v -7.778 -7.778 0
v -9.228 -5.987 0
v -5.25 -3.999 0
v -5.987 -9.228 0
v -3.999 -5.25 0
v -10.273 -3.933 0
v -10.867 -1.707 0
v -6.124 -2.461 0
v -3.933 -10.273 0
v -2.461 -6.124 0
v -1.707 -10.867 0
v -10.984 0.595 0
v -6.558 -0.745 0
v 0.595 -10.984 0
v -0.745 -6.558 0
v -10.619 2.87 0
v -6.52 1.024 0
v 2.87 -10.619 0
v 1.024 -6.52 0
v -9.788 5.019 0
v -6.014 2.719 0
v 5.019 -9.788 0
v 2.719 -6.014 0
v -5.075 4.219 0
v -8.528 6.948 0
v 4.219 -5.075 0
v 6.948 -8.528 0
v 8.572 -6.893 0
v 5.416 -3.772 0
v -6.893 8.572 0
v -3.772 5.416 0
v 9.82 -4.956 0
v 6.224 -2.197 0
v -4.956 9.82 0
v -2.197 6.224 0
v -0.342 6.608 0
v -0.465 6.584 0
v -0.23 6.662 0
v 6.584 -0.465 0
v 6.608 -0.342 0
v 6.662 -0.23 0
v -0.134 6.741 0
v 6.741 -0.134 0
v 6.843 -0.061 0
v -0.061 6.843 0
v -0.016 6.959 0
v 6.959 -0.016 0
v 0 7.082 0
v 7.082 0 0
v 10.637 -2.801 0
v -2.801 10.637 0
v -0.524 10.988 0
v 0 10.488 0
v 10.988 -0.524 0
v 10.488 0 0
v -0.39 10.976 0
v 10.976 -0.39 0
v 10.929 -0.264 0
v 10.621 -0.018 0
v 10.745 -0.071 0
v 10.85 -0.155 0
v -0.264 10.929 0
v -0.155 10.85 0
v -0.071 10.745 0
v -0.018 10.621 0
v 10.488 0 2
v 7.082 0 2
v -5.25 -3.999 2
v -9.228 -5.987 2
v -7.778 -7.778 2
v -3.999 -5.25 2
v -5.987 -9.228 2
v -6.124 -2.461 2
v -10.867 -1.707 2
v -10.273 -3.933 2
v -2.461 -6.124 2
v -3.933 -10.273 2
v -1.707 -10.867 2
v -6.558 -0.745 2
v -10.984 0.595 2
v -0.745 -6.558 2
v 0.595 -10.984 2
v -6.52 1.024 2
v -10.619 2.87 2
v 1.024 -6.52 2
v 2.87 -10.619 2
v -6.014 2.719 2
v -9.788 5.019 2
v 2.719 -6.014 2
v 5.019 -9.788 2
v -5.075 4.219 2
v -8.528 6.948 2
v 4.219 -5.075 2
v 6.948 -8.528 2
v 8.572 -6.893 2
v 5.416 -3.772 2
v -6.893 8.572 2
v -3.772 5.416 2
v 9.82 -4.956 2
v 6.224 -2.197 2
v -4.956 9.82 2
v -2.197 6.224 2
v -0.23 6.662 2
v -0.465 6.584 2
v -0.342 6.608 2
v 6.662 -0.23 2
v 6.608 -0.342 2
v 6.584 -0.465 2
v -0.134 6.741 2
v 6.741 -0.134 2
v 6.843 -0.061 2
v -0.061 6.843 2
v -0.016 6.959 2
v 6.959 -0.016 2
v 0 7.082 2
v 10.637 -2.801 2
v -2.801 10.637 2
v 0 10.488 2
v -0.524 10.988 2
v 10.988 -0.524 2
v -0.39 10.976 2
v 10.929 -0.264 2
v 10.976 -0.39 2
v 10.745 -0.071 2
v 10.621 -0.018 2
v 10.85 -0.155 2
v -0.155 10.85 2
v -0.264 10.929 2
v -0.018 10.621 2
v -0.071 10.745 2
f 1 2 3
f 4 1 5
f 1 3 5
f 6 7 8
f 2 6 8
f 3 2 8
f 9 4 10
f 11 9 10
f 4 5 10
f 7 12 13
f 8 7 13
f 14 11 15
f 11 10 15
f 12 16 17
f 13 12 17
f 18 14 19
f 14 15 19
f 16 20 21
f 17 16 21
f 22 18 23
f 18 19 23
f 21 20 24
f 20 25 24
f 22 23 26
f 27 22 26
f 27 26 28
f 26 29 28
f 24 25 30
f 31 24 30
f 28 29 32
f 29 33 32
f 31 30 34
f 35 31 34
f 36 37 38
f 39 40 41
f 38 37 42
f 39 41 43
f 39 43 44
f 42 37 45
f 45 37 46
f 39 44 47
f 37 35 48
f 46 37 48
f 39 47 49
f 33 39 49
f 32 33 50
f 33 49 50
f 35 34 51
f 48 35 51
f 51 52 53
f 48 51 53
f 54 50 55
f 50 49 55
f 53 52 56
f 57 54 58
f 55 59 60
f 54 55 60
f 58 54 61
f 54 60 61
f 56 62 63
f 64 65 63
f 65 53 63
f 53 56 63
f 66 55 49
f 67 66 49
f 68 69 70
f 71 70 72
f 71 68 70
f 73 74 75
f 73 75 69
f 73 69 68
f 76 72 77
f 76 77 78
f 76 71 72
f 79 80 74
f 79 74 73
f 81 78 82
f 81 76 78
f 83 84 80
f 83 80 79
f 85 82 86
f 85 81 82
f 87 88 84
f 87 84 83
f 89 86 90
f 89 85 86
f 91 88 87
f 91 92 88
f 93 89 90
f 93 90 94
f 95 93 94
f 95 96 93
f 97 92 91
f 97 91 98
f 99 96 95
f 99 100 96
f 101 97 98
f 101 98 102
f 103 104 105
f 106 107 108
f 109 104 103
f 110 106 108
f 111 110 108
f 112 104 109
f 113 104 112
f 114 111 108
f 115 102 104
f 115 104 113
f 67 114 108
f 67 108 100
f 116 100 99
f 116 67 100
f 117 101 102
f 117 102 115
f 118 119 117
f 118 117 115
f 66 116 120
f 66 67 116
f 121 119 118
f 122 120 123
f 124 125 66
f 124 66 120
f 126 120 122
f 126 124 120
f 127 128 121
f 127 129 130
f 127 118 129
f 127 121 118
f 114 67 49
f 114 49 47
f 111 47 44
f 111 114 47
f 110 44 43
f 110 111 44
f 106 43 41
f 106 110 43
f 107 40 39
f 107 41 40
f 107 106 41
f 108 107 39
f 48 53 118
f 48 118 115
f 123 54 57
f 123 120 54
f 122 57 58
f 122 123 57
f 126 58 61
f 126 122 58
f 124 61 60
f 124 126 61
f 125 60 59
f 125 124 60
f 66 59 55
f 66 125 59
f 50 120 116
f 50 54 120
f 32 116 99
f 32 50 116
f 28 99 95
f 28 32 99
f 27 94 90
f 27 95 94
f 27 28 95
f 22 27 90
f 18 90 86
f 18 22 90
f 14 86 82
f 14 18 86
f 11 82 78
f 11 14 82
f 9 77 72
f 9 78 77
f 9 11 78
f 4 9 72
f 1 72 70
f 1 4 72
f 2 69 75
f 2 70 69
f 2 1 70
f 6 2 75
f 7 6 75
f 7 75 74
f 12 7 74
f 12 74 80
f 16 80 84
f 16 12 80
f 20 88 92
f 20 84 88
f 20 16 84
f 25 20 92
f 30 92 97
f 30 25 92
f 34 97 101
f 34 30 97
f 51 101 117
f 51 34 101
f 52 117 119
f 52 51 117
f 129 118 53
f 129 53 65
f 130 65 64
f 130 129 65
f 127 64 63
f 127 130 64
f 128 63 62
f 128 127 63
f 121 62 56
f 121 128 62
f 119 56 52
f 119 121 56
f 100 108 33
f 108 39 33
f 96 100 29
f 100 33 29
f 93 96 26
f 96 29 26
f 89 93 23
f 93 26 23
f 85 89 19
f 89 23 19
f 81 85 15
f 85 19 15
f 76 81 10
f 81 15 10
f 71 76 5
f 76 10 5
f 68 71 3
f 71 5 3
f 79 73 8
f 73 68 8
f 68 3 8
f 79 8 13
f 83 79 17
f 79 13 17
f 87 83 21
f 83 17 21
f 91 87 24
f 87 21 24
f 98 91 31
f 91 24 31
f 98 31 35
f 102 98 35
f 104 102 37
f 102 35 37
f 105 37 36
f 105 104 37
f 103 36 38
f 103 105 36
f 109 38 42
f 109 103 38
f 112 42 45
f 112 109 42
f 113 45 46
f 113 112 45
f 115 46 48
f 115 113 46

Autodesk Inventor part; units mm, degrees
ref_plane "YZ Plane" through (0, 0, 0) normal (1, 0, 0) x (0, 1, 0)
ref_plane "XZ Plane" through (0, 0, 0) normal (0, 1, 0) x (-1, 0, 0)
ref_plane "XY Plane" through (0, 0, 0) normal (0, 0, 1) x (1, 0, 0)
sketch "Skizze1" plane through (0, 0, 0) normal (0, 0, 1) x (1, 0, 0)
  circle A0 centre (0, 0) radius 11
  circle A1 centre (0, 0) radius 6.6
  line L0 (0, 11) -> (0, 6.6)
  line L1 (11, 0) -> (6.6, 0)
  dimension "d0" = 13.2
  dimension "d1" = 22
extrude "Extrusion1" add sketch "Skizze1" along normal blind 2 contours A0 L0 A1 L1 picked at (9.3538, -1.4402)
fillet "Rundung1" radius 0.5 4 edges at (0, 11, 1) (0, 6.6, 1) (6.6, 0, 1) (11, 0, 1)
properties part number "503.017.01_Splint_Feder" material "Eisen, Grau"
